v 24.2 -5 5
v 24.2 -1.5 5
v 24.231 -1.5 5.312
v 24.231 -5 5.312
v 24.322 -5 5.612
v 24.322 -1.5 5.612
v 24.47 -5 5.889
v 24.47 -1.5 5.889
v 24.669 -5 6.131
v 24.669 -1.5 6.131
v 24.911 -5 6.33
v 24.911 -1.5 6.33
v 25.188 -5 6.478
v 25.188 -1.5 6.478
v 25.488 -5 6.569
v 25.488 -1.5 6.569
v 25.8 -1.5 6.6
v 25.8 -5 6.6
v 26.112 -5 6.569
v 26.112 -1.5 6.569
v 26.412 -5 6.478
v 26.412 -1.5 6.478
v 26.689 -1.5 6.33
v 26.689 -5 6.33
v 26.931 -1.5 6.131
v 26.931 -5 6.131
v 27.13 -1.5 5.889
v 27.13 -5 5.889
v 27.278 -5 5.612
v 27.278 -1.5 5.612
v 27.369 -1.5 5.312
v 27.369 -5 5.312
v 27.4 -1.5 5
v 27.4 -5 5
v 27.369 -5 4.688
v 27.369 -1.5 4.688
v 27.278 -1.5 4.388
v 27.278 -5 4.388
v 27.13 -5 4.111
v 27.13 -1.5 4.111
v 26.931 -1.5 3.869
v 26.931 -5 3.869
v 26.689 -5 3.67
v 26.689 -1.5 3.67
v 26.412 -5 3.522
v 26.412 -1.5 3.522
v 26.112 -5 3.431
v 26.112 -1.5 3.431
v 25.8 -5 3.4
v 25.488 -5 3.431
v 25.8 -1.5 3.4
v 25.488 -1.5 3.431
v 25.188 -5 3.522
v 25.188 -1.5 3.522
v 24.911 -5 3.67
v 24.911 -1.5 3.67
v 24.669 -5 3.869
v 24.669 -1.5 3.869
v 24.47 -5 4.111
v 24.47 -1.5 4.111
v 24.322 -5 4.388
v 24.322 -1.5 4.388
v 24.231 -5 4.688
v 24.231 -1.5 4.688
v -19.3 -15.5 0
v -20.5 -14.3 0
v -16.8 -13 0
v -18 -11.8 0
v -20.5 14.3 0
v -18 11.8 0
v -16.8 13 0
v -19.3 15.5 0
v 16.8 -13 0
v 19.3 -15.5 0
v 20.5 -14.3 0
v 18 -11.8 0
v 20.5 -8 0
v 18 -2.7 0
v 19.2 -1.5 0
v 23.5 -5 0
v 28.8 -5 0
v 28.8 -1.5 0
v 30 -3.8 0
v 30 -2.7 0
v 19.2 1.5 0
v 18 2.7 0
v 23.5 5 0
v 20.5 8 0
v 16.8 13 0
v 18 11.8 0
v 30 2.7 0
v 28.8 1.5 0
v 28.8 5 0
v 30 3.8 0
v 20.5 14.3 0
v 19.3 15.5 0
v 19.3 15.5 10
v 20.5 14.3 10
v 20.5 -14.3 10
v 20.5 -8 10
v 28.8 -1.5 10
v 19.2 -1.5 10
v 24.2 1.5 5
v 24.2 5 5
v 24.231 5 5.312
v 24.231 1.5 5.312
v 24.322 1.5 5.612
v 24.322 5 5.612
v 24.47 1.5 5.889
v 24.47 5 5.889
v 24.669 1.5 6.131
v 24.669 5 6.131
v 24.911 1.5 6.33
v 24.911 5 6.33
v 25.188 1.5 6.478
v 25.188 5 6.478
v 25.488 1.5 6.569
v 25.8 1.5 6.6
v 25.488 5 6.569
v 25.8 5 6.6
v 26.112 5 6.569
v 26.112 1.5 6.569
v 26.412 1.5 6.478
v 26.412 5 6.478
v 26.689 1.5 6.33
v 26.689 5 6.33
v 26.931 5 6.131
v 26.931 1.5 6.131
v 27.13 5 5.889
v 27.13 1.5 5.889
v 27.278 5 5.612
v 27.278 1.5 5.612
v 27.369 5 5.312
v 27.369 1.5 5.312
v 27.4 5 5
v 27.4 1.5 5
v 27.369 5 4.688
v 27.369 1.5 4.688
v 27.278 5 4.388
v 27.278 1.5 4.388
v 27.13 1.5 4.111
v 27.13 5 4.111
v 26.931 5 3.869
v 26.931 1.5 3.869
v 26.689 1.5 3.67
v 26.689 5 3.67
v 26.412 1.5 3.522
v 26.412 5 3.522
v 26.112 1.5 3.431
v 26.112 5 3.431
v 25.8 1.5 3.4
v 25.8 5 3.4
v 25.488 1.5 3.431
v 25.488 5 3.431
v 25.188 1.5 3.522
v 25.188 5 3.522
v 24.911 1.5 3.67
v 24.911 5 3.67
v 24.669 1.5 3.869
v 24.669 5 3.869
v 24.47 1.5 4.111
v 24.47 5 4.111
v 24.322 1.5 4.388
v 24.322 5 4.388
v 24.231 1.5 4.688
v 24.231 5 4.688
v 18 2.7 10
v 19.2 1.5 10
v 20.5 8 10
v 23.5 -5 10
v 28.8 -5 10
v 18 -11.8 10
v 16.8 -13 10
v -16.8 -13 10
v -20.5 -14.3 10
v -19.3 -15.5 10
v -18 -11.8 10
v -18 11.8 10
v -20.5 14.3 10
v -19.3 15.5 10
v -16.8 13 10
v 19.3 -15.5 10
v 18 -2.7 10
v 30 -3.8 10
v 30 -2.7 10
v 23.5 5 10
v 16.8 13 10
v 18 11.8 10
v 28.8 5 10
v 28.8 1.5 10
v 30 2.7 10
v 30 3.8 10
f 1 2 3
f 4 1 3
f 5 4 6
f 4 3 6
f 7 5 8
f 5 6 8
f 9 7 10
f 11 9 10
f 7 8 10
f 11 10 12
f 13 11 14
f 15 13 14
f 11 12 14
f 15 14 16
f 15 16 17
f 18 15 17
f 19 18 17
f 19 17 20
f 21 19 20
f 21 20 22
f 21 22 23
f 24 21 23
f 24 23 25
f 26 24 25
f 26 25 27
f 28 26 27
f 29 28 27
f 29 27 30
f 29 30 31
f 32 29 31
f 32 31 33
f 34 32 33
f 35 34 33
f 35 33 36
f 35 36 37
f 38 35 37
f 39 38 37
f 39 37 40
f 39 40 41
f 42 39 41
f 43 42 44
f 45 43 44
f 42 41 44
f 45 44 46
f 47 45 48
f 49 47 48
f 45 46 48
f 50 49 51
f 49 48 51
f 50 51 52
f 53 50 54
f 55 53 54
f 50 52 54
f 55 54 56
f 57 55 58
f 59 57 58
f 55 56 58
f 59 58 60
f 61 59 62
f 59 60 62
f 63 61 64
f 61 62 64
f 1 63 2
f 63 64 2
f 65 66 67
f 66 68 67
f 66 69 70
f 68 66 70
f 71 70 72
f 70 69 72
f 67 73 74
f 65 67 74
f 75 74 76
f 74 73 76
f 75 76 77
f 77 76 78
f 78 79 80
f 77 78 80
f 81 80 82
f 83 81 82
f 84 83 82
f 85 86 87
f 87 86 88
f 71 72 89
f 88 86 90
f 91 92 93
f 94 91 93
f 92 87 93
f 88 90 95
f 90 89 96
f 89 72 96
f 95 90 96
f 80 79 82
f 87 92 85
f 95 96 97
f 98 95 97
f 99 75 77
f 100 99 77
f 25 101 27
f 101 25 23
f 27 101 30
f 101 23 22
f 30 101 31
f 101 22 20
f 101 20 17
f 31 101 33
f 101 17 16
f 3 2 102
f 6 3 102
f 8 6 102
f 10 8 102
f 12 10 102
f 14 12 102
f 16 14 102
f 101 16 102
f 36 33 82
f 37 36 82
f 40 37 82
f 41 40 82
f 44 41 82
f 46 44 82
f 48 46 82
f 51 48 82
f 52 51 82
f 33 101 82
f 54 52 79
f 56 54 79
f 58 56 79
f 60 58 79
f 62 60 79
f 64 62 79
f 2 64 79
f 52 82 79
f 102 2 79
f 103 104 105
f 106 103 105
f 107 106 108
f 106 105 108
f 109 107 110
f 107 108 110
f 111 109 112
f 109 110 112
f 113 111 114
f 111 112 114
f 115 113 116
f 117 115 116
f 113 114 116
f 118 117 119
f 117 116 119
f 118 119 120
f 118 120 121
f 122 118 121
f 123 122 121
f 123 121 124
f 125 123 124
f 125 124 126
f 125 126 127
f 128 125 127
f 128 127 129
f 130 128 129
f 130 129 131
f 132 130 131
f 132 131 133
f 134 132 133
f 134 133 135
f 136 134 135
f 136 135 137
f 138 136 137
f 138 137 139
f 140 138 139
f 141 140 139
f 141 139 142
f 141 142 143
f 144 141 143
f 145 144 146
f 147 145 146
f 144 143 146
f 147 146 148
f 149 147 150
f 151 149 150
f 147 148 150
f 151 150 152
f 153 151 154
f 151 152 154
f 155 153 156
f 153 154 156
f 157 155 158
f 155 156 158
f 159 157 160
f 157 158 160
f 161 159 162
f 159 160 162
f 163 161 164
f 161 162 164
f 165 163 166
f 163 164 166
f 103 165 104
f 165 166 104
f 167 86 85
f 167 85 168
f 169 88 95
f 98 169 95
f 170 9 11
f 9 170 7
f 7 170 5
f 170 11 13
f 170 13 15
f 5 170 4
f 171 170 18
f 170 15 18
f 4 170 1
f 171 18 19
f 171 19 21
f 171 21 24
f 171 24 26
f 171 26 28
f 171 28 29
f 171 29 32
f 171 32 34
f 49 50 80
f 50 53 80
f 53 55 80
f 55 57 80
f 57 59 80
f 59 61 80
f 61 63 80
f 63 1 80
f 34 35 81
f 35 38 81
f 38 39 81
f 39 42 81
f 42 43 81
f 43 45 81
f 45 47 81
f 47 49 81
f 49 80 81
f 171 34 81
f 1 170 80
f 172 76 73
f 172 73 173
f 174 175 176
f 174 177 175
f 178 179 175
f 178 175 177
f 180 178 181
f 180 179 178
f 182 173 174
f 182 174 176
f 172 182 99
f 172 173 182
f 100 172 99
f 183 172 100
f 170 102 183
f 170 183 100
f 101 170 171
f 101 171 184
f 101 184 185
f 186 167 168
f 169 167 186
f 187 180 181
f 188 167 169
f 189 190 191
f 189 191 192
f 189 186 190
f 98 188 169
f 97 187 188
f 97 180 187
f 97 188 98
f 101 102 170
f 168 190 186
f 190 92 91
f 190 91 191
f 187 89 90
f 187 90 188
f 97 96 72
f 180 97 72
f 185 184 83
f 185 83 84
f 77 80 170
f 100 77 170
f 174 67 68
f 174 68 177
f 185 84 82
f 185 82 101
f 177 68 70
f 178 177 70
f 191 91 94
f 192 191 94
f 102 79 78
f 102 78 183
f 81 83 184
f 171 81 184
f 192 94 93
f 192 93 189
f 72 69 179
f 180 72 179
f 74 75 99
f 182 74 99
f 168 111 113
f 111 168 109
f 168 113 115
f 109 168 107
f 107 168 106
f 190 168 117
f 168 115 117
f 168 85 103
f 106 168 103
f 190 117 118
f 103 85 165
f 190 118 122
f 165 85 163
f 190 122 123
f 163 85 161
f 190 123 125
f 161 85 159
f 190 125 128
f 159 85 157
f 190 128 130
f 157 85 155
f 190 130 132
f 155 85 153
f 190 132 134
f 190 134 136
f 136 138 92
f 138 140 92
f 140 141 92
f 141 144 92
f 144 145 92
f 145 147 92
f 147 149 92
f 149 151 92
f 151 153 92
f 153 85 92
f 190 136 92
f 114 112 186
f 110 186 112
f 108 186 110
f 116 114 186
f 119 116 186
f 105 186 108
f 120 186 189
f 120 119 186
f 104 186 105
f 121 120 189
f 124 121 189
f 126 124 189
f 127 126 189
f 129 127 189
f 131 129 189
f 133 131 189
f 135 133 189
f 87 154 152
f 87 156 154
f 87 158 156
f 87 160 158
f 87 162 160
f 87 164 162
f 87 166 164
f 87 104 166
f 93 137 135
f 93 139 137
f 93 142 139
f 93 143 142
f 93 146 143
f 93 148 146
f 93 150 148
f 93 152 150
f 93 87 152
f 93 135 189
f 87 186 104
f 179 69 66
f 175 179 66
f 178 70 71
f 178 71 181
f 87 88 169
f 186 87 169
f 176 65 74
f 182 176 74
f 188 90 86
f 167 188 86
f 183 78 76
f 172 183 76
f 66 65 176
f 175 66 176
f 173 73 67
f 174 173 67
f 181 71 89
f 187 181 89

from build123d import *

# Parameters (mm, degrees)
SKETCH1_W           = 9.5
SKETCH1_H           = 3.5
SKETCH1_W_2         = 2.5
BOSS_EXTRUDE1_DEPTH = 10
CHAMFER1_SIZE       = 3
CHAMFER2_SIZE       = 1.2
SKETCH2_R           = 1.6
CUT_EXTRUDE1_DEPTH  = 10


with BuildPart() as part:
    # Sketch1 → Boss-Extrude1 (new body)
    with BuildSketch(Plane.XY):
        with Locations((25.25, 3.25)):
            Rectangle(SKETCH1_W, SKETCH1_H)
        Polygon((20.5, 15.5), (-20.5, 15.5), (-20.5, -15.5), (20.5, -15.5), (20.5, -5), (18, -5), (18, -13), (-18, -13), (-18, 13), (18, 13), (18, 5), (20.5, 5), align=None)
        with Locations((19.25, -3.25)):
            Rectangle(SKETCH1_W_2, SKETCH1_H)
        with Locations((19.25, 3.25)):
            Rectangle(SKETCH1_W_2, SKETCH1_H)
        with Locations((25.25, -3.25)):
            Rectangle(SKETCH1_W, SKETCH1_H)
    extrude(amount=BOSS_EXTRUDE1_DEPTH)

    # Chamfer1
    chamfer1_edges = [part.edges().sort_by_distance(p)[0] for p in [
        (20.5, -5, 5),
        (20.5, 5, 5),
    ]]
    chamfer(chamfer1_edges, length=CHAMFER1_SIZE)

    # Chamfer2
    chamfer2_edges = [part.edges().sort_by_distance(p)[0] for p in [
        (30, 5, 5),
        (30, 1.5, 5),
        (18, 1.5, 5),
        (18, 13, 5),
        (-18, 13, 5),
        (-18, -13, 5),
        (18, -13, 5),
        (18, -1.5, 5),
        (30, -1.5, 5),
        (30, -5, 5),
        (20.5, -15.5, 5),
        (-20.5, -15.5, 5),
        (-20.5, 15.5, 5),
        (20.5, 15.5, 5),
    ]]
    chamfer(chamfer2_edges, length=CHAMFER2_SIZE)

    # Sketch2 → Cut-Extrude1 (cut)
    with BuildSketch(Plane(origin=(0, 5, 0), x_dir=(1, 0, 0), z_dir=(0, 1, 0))):
        with Locations(Location((25.8, -5, 0), (0, 0, 180))):
            Circle(SKETCH2_R)
    extrude(amount=-CUT_EXTRUDE1_DEPTH, mode=Mode.SUBTRACT)


solid = part.part
